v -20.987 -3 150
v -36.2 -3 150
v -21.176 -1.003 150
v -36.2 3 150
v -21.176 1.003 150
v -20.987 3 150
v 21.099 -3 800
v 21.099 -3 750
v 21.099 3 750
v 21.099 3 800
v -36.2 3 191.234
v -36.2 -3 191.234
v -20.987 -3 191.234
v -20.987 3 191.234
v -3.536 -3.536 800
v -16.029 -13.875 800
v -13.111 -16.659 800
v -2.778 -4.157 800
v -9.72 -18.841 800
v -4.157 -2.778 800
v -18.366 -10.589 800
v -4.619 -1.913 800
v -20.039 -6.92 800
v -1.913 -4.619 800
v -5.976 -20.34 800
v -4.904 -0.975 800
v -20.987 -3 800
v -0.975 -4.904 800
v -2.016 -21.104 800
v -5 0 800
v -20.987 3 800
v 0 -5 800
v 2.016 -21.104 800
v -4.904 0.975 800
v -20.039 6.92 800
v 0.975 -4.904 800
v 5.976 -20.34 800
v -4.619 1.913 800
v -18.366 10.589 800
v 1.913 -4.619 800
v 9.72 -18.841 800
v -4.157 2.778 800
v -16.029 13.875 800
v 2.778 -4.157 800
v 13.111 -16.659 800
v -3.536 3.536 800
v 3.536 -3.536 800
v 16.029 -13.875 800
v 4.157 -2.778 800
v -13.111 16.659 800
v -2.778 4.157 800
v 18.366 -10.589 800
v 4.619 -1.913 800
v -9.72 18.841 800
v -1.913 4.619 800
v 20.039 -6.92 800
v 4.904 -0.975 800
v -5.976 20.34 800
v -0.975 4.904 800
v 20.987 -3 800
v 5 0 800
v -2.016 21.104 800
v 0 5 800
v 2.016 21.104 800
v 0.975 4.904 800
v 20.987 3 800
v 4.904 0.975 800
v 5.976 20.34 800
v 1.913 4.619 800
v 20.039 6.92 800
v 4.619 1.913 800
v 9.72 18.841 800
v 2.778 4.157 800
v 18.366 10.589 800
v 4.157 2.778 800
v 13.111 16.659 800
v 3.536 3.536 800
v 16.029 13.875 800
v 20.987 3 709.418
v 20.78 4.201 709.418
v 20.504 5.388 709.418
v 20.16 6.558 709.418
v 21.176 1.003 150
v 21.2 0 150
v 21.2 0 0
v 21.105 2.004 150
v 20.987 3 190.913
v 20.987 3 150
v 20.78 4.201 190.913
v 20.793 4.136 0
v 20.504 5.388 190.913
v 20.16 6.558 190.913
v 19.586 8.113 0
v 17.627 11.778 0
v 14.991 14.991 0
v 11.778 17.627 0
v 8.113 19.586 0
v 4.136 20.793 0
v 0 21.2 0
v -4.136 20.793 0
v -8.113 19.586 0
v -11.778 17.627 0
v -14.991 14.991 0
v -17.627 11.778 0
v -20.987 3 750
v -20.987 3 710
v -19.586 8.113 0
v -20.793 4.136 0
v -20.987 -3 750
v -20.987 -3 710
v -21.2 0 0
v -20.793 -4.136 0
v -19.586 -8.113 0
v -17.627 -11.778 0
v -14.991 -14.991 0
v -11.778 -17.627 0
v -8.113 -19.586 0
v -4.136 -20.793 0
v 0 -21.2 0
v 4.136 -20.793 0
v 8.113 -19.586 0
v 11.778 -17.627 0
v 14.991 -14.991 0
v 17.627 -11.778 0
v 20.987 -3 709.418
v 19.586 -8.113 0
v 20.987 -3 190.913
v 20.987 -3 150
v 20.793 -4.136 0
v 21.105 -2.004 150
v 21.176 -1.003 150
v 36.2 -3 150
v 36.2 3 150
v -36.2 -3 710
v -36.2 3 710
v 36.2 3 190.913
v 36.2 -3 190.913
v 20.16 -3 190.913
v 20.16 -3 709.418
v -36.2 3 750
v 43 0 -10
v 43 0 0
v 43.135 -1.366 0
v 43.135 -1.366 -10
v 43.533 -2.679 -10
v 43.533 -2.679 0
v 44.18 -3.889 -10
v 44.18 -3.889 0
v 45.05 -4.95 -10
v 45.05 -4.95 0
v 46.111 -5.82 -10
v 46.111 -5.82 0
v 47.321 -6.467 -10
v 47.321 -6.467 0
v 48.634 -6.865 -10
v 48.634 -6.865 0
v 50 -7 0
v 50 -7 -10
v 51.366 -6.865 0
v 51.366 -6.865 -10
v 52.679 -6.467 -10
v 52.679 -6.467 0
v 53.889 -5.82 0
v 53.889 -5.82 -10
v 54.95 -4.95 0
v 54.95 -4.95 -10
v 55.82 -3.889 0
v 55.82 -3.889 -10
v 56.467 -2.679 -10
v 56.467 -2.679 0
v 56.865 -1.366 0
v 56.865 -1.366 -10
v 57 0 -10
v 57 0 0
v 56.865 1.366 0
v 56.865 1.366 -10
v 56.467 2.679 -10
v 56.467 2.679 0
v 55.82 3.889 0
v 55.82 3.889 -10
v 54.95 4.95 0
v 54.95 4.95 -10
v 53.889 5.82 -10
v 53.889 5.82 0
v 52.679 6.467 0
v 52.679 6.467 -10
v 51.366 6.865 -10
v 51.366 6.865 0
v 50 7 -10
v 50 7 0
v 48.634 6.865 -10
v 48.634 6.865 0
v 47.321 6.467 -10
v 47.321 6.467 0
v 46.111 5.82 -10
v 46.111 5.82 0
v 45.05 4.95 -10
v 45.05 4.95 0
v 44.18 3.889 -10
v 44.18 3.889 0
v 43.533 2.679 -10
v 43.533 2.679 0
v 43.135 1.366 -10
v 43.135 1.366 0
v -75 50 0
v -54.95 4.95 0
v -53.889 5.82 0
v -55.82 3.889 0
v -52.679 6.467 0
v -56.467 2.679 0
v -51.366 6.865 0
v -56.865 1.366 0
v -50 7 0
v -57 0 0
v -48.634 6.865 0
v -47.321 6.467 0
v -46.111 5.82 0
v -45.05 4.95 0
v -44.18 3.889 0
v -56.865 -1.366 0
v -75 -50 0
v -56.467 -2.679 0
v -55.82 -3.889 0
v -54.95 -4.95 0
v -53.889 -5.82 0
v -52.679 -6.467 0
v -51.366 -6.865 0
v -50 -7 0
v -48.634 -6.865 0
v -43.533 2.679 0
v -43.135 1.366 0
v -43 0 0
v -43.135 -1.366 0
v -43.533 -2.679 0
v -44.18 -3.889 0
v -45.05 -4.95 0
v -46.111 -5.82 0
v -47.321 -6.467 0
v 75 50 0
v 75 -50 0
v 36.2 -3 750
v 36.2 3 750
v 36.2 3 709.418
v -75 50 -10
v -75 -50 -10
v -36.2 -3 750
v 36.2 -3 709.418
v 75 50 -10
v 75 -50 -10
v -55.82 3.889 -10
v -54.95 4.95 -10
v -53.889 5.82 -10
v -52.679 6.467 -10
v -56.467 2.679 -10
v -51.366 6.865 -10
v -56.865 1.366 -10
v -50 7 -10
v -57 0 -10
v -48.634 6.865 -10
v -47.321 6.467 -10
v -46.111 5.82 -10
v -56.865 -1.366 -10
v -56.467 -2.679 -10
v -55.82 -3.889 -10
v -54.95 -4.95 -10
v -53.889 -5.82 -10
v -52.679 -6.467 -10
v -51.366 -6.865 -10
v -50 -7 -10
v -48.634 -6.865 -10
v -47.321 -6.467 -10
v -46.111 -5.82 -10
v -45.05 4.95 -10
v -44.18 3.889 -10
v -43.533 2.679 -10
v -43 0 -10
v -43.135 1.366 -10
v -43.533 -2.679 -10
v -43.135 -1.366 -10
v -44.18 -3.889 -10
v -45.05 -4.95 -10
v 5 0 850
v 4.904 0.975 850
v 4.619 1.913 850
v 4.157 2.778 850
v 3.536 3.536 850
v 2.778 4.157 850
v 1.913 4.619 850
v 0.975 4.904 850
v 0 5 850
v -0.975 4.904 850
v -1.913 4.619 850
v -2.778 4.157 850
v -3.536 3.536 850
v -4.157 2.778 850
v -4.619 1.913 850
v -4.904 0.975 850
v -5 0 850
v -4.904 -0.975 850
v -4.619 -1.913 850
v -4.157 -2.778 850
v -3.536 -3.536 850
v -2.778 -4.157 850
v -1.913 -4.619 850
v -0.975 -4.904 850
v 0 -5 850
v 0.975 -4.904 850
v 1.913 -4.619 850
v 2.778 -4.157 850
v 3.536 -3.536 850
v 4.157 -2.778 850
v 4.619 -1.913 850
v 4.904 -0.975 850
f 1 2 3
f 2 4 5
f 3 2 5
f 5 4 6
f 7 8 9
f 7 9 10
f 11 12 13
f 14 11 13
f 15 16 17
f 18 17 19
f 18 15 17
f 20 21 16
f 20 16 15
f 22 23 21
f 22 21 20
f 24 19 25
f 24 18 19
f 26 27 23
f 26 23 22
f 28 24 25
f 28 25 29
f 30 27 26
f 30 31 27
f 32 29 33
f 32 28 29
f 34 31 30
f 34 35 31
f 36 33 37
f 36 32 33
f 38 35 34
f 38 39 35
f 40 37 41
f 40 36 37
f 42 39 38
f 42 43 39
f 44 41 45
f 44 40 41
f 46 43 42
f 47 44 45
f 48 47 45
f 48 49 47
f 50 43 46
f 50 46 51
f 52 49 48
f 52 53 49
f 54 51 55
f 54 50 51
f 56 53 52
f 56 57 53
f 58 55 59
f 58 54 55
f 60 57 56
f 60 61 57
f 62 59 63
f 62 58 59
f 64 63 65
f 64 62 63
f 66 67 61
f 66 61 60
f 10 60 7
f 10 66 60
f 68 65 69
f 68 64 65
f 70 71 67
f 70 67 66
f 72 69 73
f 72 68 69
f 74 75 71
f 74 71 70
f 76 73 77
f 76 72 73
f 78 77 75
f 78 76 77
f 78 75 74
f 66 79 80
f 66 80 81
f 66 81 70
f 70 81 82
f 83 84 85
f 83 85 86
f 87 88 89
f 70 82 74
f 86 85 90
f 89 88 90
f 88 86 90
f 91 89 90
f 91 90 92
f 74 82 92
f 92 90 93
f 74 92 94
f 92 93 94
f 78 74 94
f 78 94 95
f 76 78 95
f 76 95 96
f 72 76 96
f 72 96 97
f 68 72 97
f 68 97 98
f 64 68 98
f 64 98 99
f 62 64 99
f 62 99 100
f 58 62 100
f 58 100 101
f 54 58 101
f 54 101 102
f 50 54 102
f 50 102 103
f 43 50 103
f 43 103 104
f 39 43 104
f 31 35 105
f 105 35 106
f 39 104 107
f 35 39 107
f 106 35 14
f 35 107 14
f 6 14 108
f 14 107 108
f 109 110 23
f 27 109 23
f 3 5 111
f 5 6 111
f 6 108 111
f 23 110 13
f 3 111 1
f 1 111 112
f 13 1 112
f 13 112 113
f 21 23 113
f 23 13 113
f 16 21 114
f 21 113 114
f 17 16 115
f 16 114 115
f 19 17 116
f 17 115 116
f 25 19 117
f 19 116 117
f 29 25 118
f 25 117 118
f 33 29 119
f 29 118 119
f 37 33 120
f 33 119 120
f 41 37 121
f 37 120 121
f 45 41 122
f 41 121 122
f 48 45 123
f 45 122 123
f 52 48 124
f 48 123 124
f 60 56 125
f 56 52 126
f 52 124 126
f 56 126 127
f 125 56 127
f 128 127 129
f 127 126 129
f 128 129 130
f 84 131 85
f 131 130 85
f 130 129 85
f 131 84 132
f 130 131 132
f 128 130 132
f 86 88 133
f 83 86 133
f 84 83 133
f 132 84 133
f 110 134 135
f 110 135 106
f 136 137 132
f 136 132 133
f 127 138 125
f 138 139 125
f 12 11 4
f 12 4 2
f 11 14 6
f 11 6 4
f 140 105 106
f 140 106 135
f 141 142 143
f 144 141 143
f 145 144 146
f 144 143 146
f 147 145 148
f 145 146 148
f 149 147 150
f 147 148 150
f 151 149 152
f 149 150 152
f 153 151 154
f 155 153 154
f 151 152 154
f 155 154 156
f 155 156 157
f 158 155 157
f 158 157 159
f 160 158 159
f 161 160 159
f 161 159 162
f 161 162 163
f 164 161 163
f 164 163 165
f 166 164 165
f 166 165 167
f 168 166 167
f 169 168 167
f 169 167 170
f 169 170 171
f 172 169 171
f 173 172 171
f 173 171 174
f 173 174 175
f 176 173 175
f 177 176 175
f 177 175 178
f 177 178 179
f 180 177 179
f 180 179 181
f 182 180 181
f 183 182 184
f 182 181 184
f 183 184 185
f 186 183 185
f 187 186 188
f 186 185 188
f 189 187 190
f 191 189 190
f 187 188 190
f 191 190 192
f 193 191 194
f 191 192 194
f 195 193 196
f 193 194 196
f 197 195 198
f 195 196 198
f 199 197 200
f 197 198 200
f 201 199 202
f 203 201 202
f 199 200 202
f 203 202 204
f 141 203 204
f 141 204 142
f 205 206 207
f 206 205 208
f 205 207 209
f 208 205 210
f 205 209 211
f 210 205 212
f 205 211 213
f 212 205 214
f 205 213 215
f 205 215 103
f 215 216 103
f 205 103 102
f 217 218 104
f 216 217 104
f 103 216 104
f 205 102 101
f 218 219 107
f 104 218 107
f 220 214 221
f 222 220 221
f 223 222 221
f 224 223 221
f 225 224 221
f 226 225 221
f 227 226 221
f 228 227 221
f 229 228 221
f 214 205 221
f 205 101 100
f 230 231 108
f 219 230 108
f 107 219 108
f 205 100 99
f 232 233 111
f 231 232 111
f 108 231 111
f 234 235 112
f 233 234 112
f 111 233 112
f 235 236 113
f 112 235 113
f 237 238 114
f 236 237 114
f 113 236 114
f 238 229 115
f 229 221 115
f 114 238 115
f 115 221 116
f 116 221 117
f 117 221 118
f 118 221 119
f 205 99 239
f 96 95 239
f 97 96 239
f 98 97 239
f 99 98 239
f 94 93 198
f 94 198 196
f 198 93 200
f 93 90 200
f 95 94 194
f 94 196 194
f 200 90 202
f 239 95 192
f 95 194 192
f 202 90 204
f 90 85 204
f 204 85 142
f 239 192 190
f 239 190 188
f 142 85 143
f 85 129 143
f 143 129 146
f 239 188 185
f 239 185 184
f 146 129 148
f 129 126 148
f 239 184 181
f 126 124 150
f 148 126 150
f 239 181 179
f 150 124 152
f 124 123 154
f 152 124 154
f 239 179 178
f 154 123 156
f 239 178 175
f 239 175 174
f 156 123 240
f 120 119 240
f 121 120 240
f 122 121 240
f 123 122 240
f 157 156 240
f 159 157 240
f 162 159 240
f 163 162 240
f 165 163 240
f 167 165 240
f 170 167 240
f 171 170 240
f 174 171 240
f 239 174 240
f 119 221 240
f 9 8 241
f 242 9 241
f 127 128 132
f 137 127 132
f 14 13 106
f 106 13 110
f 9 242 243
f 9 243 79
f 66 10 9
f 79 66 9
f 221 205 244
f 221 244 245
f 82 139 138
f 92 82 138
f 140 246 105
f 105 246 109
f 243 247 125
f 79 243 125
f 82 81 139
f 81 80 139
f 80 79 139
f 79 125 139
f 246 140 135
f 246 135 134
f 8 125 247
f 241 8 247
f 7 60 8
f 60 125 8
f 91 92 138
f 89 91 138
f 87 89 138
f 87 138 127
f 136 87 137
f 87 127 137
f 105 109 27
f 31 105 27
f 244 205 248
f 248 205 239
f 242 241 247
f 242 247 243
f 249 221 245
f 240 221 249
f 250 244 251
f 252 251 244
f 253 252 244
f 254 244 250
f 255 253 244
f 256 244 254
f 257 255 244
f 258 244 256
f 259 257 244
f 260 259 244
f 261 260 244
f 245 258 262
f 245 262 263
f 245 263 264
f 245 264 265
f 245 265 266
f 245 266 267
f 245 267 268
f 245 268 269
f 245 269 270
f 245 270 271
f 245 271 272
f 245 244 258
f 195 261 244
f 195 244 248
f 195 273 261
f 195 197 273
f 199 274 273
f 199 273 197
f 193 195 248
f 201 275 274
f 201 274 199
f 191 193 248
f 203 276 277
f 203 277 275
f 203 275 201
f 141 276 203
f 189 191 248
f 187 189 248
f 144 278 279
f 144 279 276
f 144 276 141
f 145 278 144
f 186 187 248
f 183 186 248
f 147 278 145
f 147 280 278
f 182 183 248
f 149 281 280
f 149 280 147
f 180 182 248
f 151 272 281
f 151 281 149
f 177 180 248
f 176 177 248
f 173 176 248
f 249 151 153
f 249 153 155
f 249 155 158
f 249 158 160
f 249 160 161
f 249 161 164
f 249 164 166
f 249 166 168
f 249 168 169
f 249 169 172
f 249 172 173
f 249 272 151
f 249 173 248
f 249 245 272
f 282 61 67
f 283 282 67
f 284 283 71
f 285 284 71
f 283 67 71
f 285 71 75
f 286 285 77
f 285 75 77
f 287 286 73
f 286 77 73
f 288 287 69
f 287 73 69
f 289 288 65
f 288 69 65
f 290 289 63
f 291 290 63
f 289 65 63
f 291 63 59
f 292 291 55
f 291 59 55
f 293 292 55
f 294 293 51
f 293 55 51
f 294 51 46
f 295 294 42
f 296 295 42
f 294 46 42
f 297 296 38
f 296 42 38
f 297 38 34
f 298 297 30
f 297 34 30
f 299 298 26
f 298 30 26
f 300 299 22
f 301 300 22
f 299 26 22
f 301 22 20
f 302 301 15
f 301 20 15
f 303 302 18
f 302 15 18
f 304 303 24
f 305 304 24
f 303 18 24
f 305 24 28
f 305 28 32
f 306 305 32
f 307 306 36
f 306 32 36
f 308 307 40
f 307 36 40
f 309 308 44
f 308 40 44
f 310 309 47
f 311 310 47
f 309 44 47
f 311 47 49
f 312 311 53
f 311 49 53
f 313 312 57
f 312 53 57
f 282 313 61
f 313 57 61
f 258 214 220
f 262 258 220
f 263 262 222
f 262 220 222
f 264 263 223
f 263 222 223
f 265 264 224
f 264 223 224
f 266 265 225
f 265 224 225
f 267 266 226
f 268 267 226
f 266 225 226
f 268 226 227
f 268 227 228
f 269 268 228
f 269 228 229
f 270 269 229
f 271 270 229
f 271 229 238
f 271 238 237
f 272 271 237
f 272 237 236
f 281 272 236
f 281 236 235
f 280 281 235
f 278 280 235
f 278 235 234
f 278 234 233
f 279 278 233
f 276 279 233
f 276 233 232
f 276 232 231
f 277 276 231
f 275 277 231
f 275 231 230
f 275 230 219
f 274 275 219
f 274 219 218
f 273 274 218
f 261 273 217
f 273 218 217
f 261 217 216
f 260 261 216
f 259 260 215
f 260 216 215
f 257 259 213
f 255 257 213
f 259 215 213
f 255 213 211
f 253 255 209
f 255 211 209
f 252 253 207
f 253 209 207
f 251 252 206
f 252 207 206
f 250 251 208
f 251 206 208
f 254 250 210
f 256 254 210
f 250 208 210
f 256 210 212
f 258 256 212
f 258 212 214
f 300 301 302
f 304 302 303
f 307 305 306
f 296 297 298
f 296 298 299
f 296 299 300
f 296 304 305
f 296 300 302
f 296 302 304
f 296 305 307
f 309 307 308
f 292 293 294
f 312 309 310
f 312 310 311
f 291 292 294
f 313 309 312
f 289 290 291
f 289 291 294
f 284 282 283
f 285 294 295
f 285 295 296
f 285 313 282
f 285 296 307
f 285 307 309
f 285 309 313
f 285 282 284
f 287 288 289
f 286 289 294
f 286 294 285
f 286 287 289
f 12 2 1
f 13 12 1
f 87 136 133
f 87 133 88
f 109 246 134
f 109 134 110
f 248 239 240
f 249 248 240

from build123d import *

# Parameters (mm, degrees)
F0_R      = 21.2
F1_DEPTH  = 800
F2_R      = 5
F3_DEPTH  = 50
F4_W      = 150
F4_H      = 100
F5_DEPTH  = 10
F7_D      = 14
F9_DEPTH  = 650
F10_W     = 18.732145
F10_H     = 50
F10_W_2   = 18.157326
F11_DEPTH = 25
F12_W     = 15.213338
F12_H     = 518.766022
F13_DEPTH = 25


with BuildPart() as f1:
    # F0 (on Top) → F1 (new body)
    with BuildSketch(Plane.XY):
        Circle(F0_R)
    extrude(amount=F1_DEPTH)

    # F2 (on face) → F3 (join)
    with BuildSketch(Plane.XY.offset(800)):
        Circle(F2_R)
    extrude(amount=F3_DEPTH)

    # F4 (on face) → F5 (join)
    with BuildSketch(Plane(origin=(0, 0, 0), x_dir=(1, 0, 0), z_dir=(0, 0, -1))):
        Rectangle(F4_W, F4_H)
    extrude(amount=F5_DEPTH)

    # F7 (through all)
    with Locations(Plane(origin=(0, 0, -10), x_dir=(1, 0, 0), z_dir=(0, 0, -1))):
        with Locations((-50, 0), (50, 0)):
            Hole(F7_D / 2)

    # F8 (on face) → F9 (join)
    with BuildSketch(Plane.XY.offset(800)):
        Polygon((36.2, -3), (36.2, 0), (36.2, 3), (20.986662, 3), (20.986662, -3), align=None)
        Polygon((-36.2, 3), (-36.2, 0), (-36.2, -3), (-20.986662, -3), (-20.986662, 3), align=None)
    extrude(amount=-F9_DEPTH)

    # F10 (on face) → F11 (cut)
    with BuildSketch(Plane.XZ.offset(3)):
        with Locations((-30.352734, 775)):
            Rectangle(F10_W, F10_H)
        with Locations((30.178081, 775)):
            Rectangle(F10_W_2, F10_H)
    extrude(amount=-F11_DEPTH, mode=Mode.SUBTRACT)

    # F12 (on face) → F13 (cut)
    with BuildSketch(Plane.XZ.offset(3)):
        with Locations((-28.593331, 450.616989)):
            Rectangle(F12_W, F12_H)
        Polygon((39.251614, 190.913462), (39.251614, 709.418058), (20.16026, 709.418058), (20.16026, 190.913462), (36.762826, 190.913462), align=None)
    extrude(amount=-F13_DEPTH, mode=Mode.SUBTRACT)


solid = f1.part
